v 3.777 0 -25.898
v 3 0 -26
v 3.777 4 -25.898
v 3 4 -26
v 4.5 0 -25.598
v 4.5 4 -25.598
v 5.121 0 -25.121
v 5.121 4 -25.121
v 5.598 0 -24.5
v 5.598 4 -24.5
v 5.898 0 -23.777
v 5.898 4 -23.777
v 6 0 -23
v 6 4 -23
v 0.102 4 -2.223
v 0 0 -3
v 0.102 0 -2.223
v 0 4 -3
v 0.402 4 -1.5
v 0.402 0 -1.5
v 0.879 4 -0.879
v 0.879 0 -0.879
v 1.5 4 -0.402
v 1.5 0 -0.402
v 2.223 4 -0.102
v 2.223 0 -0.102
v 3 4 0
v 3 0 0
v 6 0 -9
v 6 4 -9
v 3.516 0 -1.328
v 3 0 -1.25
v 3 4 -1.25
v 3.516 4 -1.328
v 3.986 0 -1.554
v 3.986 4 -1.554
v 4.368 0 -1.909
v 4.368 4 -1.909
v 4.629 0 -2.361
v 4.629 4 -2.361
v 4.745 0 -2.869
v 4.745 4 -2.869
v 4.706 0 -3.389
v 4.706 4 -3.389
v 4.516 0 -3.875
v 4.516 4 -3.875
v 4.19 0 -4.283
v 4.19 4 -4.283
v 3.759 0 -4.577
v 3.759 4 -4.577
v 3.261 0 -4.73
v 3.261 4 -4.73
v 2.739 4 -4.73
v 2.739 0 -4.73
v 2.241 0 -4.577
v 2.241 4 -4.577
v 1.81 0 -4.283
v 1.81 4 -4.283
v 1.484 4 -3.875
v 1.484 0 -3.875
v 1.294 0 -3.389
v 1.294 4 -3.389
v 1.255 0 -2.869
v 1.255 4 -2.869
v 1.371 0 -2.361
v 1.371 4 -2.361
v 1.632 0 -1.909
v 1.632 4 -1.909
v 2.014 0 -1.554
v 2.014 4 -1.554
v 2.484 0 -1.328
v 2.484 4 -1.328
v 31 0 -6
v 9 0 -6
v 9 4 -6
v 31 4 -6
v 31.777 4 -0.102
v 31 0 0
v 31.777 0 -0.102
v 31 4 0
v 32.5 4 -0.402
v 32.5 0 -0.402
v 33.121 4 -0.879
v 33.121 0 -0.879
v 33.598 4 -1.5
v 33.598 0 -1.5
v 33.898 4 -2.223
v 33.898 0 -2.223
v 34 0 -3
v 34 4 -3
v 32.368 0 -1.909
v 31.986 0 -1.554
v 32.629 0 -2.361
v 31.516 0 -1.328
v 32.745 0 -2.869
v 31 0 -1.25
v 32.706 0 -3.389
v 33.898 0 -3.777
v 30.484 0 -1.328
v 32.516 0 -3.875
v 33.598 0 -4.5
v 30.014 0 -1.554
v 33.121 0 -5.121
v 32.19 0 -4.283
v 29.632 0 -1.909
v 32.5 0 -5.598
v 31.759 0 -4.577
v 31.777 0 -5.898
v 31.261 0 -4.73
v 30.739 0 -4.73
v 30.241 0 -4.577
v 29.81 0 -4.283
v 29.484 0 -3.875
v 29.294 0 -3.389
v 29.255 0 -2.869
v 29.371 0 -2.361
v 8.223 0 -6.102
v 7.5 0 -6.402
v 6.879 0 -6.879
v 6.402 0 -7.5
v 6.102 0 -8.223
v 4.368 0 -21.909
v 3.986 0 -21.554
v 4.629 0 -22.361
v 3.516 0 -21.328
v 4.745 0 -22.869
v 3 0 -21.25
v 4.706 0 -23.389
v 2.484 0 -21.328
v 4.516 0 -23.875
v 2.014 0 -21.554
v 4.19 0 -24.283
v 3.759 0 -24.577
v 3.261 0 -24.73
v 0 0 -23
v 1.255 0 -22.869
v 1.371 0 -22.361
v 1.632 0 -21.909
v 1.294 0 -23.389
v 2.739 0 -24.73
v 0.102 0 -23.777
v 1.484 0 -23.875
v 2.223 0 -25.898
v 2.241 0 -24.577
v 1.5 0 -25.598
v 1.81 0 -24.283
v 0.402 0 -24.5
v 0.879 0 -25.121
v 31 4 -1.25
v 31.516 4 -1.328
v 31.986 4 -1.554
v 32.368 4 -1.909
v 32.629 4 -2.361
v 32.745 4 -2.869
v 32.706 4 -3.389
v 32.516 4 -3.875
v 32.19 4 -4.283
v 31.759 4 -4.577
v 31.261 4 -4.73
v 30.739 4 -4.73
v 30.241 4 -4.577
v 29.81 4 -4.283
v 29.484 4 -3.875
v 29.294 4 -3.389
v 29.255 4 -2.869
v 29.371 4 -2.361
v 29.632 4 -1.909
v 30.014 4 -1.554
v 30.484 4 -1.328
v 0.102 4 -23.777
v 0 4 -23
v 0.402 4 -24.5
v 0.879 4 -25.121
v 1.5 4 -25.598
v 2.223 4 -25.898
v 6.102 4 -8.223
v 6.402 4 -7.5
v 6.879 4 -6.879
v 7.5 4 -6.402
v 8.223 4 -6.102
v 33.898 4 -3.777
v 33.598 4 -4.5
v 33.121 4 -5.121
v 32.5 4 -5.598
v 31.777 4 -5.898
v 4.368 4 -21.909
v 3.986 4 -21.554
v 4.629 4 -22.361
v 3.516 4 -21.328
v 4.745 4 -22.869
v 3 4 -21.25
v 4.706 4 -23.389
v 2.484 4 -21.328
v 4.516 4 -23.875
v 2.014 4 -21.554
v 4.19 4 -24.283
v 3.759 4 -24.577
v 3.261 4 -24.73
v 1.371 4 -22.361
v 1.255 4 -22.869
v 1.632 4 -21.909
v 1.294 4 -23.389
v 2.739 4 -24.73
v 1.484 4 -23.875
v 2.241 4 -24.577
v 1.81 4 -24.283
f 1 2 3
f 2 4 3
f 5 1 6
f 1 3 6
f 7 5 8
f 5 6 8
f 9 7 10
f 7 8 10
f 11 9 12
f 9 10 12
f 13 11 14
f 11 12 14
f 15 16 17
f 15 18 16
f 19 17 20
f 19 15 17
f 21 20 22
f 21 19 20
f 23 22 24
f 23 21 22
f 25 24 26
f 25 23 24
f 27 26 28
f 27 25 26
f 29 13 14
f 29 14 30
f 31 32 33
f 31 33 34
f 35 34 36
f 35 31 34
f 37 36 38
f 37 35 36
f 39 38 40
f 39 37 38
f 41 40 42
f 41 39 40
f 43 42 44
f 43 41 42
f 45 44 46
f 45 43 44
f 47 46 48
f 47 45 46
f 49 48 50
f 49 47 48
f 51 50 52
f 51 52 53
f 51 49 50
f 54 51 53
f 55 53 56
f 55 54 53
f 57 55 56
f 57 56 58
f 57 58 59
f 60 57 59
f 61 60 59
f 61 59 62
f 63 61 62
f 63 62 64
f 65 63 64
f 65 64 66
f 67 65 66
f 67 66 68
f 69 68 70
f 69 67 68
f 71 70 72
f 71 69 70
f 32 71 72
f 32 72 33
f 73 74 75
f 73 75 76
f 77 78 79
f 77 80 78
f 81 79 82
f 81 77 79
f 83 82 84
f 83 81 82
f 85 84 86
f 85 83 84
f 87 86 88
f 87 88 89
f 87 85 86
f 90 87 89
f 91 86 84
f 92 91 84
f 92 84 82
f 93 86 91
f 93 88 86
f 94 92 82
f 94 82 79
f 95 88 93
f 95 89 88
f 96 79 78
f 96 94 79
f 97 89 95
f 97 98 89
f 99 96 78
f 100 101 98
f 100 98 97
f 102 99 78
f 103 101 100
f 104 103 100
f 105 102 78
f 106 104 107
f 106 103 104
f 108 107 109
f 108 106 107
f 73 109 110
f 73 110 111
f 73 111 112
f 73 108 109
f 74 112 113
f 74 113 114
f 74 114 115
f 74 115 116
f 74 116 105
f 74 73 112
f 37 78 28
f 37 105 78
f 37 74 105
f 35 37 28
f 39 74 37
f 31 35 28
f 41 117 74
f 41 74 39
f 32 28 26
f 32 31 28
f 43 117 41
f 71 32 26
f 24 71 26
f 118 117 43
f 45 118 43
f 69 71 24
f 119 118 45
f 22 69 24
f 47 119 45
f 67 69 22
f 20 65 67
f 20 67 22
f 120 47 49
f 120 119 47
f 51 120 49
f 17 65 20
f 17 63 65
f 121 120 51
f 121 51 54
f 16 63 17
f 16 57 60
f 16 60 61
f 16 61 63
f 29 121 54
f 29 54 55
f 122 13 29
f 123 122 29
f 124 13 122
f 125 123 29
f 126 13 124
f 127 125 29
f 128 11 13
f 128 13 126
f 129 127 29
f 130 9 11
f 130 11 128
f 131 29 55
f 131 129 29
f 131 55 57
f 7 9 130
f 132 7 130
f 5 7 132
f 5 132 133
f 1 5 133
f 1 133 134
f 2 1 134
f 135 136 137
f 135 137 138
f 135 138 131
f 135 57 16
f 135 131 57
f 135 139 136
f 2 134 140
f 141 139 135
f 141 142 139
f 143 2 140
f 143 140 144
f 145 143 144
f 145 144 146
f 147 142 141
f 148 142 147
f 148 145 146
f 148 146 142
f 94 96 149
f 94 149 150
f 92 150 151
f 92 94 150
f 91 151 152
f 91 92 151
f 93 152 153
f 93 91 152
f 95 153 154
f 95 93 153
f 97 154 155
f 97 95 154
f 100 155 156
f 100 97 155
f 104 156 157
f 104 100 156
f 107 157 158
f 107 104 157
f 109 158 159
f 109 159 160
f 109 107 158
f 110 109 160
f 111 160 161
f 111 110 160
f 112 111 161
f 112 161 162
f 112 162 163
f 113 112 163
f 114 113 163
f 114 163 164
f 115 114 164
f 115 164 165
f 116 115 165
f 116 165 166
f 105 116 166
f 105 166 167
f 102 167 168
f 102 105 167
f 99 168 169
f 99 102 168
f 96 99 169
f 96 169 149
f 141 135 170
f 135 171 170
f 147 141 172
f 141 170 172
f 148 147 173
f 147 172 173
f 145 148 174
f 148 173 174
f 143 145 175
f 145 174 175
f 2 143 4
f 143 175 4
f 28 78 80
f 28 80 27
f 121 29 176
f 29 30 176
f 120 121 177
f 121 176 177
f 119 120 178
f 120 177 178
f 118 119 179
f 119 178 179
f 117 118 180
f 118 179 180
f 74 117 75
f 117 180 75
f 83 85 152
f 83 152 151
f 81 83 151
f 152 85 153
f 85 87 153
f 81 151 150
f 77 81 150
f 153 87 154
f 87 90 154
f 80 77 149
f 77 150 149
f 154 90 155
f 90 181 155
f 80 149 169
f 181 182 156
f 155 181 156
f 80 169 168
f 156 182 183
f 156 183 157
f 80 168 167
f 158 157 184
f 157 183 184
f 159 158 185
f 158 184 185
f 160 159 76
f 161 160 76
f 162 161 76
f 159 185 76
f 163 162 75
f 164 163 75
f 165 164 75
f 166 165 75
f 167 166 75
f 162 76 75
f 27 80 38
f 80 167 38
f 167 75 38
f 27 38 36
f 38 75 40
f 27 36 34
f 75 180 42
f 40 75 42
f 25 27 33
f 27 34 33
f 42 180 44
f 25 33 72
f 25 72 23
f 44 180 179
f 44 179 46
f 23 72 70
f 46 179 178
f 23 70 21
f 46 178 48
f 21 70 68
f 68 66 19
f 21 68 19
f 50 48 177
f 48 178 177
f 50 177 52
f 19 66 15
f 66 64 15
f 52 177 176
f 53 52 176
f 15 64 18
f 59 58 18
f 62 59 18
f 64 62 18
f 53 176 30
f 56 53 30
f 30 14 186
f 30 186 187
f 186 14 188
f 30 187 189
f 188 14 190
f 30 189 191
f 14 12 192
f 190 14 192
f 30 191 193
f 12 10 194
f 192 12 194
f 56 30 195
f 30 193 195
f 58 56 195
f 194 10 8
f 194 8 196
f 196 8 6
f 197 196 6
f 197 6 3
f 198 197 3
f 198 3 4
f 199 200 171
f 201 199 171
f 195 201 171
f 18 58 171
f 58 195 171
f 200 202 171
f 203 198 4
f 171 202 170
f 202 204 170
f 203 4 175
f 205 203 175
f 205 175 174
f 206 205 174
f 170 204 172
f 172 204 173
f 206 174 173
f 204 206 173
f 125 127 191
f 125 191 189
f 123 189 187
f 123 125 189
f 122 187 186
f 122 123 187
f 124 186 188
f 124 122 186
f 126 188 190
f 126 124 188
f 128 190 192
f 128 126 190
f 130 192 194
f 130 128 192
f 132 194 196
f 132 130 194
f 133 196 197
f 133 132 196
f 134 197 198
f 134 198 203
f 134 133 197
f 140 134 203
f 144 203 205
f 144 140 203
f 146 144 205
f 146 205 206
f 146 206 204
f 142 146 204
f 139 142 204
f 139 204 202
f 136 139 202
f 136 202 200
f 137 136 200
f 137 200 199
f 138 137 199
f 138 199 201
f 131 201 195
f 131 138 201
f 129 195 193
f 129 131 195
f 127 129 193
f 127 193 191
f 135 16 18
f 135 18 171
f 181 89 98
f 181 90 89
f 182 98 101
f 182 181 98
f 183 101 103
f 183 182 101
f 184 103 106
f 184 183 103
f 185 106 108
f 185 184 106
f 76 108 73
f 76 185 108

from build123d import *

# Parameters (mm, degrees)
CROQUIS1_R              = 1.75
SALIENTE_EXTRUIR1_DEPTH = 4
REDONDEO1_R             = 3


with BuildPart() as part:
    # Croquis1 → Saliente-Extruir1 (new body)
    with BuildSketch(Plane(origin=(0, 0, 0), x_dir=(1, 0, 0), z_dir=(0, 1, 0))):
        Polygon((0, 0), (0, 26), (6, 26), (6, 6), (34, 6), (34, 0), align=None)
        with Locations(Location((3, 23, 0), (0, 0, 270))):
            Circle(CROQUIS1_R, mode=Mode.SUBTRACT)
        with Locations(Location((31, 3, 0), (0, 0, 270))):
            Circle(CROQUIS1_R, mode=Mode.SUBTRACT)
        with Locations(Location((3, 3, 0), (0, 0, 270))):
            Circle(CROQUIS1_R, mode=Mode.SUBTRACT)
    extrude(amount=SALIENTE_EXTRUIR1_DEPTH)

    # Redondeo1
    redondeo1_edges = [part.edges().sort_by_distance(p)[0] for p in [
        (6, 2, -6),
        (0, 2, 0),
        (0, 2, -26),
        (6, 2, -26),
        (34, 2, -6),
        (34, 2, 0),
    ]]
    fillet(redondeo1_edges, radius=REDONDEO1_R - 0.0001)  # a hair under: the kernel refuses the full size


solid = part.part
